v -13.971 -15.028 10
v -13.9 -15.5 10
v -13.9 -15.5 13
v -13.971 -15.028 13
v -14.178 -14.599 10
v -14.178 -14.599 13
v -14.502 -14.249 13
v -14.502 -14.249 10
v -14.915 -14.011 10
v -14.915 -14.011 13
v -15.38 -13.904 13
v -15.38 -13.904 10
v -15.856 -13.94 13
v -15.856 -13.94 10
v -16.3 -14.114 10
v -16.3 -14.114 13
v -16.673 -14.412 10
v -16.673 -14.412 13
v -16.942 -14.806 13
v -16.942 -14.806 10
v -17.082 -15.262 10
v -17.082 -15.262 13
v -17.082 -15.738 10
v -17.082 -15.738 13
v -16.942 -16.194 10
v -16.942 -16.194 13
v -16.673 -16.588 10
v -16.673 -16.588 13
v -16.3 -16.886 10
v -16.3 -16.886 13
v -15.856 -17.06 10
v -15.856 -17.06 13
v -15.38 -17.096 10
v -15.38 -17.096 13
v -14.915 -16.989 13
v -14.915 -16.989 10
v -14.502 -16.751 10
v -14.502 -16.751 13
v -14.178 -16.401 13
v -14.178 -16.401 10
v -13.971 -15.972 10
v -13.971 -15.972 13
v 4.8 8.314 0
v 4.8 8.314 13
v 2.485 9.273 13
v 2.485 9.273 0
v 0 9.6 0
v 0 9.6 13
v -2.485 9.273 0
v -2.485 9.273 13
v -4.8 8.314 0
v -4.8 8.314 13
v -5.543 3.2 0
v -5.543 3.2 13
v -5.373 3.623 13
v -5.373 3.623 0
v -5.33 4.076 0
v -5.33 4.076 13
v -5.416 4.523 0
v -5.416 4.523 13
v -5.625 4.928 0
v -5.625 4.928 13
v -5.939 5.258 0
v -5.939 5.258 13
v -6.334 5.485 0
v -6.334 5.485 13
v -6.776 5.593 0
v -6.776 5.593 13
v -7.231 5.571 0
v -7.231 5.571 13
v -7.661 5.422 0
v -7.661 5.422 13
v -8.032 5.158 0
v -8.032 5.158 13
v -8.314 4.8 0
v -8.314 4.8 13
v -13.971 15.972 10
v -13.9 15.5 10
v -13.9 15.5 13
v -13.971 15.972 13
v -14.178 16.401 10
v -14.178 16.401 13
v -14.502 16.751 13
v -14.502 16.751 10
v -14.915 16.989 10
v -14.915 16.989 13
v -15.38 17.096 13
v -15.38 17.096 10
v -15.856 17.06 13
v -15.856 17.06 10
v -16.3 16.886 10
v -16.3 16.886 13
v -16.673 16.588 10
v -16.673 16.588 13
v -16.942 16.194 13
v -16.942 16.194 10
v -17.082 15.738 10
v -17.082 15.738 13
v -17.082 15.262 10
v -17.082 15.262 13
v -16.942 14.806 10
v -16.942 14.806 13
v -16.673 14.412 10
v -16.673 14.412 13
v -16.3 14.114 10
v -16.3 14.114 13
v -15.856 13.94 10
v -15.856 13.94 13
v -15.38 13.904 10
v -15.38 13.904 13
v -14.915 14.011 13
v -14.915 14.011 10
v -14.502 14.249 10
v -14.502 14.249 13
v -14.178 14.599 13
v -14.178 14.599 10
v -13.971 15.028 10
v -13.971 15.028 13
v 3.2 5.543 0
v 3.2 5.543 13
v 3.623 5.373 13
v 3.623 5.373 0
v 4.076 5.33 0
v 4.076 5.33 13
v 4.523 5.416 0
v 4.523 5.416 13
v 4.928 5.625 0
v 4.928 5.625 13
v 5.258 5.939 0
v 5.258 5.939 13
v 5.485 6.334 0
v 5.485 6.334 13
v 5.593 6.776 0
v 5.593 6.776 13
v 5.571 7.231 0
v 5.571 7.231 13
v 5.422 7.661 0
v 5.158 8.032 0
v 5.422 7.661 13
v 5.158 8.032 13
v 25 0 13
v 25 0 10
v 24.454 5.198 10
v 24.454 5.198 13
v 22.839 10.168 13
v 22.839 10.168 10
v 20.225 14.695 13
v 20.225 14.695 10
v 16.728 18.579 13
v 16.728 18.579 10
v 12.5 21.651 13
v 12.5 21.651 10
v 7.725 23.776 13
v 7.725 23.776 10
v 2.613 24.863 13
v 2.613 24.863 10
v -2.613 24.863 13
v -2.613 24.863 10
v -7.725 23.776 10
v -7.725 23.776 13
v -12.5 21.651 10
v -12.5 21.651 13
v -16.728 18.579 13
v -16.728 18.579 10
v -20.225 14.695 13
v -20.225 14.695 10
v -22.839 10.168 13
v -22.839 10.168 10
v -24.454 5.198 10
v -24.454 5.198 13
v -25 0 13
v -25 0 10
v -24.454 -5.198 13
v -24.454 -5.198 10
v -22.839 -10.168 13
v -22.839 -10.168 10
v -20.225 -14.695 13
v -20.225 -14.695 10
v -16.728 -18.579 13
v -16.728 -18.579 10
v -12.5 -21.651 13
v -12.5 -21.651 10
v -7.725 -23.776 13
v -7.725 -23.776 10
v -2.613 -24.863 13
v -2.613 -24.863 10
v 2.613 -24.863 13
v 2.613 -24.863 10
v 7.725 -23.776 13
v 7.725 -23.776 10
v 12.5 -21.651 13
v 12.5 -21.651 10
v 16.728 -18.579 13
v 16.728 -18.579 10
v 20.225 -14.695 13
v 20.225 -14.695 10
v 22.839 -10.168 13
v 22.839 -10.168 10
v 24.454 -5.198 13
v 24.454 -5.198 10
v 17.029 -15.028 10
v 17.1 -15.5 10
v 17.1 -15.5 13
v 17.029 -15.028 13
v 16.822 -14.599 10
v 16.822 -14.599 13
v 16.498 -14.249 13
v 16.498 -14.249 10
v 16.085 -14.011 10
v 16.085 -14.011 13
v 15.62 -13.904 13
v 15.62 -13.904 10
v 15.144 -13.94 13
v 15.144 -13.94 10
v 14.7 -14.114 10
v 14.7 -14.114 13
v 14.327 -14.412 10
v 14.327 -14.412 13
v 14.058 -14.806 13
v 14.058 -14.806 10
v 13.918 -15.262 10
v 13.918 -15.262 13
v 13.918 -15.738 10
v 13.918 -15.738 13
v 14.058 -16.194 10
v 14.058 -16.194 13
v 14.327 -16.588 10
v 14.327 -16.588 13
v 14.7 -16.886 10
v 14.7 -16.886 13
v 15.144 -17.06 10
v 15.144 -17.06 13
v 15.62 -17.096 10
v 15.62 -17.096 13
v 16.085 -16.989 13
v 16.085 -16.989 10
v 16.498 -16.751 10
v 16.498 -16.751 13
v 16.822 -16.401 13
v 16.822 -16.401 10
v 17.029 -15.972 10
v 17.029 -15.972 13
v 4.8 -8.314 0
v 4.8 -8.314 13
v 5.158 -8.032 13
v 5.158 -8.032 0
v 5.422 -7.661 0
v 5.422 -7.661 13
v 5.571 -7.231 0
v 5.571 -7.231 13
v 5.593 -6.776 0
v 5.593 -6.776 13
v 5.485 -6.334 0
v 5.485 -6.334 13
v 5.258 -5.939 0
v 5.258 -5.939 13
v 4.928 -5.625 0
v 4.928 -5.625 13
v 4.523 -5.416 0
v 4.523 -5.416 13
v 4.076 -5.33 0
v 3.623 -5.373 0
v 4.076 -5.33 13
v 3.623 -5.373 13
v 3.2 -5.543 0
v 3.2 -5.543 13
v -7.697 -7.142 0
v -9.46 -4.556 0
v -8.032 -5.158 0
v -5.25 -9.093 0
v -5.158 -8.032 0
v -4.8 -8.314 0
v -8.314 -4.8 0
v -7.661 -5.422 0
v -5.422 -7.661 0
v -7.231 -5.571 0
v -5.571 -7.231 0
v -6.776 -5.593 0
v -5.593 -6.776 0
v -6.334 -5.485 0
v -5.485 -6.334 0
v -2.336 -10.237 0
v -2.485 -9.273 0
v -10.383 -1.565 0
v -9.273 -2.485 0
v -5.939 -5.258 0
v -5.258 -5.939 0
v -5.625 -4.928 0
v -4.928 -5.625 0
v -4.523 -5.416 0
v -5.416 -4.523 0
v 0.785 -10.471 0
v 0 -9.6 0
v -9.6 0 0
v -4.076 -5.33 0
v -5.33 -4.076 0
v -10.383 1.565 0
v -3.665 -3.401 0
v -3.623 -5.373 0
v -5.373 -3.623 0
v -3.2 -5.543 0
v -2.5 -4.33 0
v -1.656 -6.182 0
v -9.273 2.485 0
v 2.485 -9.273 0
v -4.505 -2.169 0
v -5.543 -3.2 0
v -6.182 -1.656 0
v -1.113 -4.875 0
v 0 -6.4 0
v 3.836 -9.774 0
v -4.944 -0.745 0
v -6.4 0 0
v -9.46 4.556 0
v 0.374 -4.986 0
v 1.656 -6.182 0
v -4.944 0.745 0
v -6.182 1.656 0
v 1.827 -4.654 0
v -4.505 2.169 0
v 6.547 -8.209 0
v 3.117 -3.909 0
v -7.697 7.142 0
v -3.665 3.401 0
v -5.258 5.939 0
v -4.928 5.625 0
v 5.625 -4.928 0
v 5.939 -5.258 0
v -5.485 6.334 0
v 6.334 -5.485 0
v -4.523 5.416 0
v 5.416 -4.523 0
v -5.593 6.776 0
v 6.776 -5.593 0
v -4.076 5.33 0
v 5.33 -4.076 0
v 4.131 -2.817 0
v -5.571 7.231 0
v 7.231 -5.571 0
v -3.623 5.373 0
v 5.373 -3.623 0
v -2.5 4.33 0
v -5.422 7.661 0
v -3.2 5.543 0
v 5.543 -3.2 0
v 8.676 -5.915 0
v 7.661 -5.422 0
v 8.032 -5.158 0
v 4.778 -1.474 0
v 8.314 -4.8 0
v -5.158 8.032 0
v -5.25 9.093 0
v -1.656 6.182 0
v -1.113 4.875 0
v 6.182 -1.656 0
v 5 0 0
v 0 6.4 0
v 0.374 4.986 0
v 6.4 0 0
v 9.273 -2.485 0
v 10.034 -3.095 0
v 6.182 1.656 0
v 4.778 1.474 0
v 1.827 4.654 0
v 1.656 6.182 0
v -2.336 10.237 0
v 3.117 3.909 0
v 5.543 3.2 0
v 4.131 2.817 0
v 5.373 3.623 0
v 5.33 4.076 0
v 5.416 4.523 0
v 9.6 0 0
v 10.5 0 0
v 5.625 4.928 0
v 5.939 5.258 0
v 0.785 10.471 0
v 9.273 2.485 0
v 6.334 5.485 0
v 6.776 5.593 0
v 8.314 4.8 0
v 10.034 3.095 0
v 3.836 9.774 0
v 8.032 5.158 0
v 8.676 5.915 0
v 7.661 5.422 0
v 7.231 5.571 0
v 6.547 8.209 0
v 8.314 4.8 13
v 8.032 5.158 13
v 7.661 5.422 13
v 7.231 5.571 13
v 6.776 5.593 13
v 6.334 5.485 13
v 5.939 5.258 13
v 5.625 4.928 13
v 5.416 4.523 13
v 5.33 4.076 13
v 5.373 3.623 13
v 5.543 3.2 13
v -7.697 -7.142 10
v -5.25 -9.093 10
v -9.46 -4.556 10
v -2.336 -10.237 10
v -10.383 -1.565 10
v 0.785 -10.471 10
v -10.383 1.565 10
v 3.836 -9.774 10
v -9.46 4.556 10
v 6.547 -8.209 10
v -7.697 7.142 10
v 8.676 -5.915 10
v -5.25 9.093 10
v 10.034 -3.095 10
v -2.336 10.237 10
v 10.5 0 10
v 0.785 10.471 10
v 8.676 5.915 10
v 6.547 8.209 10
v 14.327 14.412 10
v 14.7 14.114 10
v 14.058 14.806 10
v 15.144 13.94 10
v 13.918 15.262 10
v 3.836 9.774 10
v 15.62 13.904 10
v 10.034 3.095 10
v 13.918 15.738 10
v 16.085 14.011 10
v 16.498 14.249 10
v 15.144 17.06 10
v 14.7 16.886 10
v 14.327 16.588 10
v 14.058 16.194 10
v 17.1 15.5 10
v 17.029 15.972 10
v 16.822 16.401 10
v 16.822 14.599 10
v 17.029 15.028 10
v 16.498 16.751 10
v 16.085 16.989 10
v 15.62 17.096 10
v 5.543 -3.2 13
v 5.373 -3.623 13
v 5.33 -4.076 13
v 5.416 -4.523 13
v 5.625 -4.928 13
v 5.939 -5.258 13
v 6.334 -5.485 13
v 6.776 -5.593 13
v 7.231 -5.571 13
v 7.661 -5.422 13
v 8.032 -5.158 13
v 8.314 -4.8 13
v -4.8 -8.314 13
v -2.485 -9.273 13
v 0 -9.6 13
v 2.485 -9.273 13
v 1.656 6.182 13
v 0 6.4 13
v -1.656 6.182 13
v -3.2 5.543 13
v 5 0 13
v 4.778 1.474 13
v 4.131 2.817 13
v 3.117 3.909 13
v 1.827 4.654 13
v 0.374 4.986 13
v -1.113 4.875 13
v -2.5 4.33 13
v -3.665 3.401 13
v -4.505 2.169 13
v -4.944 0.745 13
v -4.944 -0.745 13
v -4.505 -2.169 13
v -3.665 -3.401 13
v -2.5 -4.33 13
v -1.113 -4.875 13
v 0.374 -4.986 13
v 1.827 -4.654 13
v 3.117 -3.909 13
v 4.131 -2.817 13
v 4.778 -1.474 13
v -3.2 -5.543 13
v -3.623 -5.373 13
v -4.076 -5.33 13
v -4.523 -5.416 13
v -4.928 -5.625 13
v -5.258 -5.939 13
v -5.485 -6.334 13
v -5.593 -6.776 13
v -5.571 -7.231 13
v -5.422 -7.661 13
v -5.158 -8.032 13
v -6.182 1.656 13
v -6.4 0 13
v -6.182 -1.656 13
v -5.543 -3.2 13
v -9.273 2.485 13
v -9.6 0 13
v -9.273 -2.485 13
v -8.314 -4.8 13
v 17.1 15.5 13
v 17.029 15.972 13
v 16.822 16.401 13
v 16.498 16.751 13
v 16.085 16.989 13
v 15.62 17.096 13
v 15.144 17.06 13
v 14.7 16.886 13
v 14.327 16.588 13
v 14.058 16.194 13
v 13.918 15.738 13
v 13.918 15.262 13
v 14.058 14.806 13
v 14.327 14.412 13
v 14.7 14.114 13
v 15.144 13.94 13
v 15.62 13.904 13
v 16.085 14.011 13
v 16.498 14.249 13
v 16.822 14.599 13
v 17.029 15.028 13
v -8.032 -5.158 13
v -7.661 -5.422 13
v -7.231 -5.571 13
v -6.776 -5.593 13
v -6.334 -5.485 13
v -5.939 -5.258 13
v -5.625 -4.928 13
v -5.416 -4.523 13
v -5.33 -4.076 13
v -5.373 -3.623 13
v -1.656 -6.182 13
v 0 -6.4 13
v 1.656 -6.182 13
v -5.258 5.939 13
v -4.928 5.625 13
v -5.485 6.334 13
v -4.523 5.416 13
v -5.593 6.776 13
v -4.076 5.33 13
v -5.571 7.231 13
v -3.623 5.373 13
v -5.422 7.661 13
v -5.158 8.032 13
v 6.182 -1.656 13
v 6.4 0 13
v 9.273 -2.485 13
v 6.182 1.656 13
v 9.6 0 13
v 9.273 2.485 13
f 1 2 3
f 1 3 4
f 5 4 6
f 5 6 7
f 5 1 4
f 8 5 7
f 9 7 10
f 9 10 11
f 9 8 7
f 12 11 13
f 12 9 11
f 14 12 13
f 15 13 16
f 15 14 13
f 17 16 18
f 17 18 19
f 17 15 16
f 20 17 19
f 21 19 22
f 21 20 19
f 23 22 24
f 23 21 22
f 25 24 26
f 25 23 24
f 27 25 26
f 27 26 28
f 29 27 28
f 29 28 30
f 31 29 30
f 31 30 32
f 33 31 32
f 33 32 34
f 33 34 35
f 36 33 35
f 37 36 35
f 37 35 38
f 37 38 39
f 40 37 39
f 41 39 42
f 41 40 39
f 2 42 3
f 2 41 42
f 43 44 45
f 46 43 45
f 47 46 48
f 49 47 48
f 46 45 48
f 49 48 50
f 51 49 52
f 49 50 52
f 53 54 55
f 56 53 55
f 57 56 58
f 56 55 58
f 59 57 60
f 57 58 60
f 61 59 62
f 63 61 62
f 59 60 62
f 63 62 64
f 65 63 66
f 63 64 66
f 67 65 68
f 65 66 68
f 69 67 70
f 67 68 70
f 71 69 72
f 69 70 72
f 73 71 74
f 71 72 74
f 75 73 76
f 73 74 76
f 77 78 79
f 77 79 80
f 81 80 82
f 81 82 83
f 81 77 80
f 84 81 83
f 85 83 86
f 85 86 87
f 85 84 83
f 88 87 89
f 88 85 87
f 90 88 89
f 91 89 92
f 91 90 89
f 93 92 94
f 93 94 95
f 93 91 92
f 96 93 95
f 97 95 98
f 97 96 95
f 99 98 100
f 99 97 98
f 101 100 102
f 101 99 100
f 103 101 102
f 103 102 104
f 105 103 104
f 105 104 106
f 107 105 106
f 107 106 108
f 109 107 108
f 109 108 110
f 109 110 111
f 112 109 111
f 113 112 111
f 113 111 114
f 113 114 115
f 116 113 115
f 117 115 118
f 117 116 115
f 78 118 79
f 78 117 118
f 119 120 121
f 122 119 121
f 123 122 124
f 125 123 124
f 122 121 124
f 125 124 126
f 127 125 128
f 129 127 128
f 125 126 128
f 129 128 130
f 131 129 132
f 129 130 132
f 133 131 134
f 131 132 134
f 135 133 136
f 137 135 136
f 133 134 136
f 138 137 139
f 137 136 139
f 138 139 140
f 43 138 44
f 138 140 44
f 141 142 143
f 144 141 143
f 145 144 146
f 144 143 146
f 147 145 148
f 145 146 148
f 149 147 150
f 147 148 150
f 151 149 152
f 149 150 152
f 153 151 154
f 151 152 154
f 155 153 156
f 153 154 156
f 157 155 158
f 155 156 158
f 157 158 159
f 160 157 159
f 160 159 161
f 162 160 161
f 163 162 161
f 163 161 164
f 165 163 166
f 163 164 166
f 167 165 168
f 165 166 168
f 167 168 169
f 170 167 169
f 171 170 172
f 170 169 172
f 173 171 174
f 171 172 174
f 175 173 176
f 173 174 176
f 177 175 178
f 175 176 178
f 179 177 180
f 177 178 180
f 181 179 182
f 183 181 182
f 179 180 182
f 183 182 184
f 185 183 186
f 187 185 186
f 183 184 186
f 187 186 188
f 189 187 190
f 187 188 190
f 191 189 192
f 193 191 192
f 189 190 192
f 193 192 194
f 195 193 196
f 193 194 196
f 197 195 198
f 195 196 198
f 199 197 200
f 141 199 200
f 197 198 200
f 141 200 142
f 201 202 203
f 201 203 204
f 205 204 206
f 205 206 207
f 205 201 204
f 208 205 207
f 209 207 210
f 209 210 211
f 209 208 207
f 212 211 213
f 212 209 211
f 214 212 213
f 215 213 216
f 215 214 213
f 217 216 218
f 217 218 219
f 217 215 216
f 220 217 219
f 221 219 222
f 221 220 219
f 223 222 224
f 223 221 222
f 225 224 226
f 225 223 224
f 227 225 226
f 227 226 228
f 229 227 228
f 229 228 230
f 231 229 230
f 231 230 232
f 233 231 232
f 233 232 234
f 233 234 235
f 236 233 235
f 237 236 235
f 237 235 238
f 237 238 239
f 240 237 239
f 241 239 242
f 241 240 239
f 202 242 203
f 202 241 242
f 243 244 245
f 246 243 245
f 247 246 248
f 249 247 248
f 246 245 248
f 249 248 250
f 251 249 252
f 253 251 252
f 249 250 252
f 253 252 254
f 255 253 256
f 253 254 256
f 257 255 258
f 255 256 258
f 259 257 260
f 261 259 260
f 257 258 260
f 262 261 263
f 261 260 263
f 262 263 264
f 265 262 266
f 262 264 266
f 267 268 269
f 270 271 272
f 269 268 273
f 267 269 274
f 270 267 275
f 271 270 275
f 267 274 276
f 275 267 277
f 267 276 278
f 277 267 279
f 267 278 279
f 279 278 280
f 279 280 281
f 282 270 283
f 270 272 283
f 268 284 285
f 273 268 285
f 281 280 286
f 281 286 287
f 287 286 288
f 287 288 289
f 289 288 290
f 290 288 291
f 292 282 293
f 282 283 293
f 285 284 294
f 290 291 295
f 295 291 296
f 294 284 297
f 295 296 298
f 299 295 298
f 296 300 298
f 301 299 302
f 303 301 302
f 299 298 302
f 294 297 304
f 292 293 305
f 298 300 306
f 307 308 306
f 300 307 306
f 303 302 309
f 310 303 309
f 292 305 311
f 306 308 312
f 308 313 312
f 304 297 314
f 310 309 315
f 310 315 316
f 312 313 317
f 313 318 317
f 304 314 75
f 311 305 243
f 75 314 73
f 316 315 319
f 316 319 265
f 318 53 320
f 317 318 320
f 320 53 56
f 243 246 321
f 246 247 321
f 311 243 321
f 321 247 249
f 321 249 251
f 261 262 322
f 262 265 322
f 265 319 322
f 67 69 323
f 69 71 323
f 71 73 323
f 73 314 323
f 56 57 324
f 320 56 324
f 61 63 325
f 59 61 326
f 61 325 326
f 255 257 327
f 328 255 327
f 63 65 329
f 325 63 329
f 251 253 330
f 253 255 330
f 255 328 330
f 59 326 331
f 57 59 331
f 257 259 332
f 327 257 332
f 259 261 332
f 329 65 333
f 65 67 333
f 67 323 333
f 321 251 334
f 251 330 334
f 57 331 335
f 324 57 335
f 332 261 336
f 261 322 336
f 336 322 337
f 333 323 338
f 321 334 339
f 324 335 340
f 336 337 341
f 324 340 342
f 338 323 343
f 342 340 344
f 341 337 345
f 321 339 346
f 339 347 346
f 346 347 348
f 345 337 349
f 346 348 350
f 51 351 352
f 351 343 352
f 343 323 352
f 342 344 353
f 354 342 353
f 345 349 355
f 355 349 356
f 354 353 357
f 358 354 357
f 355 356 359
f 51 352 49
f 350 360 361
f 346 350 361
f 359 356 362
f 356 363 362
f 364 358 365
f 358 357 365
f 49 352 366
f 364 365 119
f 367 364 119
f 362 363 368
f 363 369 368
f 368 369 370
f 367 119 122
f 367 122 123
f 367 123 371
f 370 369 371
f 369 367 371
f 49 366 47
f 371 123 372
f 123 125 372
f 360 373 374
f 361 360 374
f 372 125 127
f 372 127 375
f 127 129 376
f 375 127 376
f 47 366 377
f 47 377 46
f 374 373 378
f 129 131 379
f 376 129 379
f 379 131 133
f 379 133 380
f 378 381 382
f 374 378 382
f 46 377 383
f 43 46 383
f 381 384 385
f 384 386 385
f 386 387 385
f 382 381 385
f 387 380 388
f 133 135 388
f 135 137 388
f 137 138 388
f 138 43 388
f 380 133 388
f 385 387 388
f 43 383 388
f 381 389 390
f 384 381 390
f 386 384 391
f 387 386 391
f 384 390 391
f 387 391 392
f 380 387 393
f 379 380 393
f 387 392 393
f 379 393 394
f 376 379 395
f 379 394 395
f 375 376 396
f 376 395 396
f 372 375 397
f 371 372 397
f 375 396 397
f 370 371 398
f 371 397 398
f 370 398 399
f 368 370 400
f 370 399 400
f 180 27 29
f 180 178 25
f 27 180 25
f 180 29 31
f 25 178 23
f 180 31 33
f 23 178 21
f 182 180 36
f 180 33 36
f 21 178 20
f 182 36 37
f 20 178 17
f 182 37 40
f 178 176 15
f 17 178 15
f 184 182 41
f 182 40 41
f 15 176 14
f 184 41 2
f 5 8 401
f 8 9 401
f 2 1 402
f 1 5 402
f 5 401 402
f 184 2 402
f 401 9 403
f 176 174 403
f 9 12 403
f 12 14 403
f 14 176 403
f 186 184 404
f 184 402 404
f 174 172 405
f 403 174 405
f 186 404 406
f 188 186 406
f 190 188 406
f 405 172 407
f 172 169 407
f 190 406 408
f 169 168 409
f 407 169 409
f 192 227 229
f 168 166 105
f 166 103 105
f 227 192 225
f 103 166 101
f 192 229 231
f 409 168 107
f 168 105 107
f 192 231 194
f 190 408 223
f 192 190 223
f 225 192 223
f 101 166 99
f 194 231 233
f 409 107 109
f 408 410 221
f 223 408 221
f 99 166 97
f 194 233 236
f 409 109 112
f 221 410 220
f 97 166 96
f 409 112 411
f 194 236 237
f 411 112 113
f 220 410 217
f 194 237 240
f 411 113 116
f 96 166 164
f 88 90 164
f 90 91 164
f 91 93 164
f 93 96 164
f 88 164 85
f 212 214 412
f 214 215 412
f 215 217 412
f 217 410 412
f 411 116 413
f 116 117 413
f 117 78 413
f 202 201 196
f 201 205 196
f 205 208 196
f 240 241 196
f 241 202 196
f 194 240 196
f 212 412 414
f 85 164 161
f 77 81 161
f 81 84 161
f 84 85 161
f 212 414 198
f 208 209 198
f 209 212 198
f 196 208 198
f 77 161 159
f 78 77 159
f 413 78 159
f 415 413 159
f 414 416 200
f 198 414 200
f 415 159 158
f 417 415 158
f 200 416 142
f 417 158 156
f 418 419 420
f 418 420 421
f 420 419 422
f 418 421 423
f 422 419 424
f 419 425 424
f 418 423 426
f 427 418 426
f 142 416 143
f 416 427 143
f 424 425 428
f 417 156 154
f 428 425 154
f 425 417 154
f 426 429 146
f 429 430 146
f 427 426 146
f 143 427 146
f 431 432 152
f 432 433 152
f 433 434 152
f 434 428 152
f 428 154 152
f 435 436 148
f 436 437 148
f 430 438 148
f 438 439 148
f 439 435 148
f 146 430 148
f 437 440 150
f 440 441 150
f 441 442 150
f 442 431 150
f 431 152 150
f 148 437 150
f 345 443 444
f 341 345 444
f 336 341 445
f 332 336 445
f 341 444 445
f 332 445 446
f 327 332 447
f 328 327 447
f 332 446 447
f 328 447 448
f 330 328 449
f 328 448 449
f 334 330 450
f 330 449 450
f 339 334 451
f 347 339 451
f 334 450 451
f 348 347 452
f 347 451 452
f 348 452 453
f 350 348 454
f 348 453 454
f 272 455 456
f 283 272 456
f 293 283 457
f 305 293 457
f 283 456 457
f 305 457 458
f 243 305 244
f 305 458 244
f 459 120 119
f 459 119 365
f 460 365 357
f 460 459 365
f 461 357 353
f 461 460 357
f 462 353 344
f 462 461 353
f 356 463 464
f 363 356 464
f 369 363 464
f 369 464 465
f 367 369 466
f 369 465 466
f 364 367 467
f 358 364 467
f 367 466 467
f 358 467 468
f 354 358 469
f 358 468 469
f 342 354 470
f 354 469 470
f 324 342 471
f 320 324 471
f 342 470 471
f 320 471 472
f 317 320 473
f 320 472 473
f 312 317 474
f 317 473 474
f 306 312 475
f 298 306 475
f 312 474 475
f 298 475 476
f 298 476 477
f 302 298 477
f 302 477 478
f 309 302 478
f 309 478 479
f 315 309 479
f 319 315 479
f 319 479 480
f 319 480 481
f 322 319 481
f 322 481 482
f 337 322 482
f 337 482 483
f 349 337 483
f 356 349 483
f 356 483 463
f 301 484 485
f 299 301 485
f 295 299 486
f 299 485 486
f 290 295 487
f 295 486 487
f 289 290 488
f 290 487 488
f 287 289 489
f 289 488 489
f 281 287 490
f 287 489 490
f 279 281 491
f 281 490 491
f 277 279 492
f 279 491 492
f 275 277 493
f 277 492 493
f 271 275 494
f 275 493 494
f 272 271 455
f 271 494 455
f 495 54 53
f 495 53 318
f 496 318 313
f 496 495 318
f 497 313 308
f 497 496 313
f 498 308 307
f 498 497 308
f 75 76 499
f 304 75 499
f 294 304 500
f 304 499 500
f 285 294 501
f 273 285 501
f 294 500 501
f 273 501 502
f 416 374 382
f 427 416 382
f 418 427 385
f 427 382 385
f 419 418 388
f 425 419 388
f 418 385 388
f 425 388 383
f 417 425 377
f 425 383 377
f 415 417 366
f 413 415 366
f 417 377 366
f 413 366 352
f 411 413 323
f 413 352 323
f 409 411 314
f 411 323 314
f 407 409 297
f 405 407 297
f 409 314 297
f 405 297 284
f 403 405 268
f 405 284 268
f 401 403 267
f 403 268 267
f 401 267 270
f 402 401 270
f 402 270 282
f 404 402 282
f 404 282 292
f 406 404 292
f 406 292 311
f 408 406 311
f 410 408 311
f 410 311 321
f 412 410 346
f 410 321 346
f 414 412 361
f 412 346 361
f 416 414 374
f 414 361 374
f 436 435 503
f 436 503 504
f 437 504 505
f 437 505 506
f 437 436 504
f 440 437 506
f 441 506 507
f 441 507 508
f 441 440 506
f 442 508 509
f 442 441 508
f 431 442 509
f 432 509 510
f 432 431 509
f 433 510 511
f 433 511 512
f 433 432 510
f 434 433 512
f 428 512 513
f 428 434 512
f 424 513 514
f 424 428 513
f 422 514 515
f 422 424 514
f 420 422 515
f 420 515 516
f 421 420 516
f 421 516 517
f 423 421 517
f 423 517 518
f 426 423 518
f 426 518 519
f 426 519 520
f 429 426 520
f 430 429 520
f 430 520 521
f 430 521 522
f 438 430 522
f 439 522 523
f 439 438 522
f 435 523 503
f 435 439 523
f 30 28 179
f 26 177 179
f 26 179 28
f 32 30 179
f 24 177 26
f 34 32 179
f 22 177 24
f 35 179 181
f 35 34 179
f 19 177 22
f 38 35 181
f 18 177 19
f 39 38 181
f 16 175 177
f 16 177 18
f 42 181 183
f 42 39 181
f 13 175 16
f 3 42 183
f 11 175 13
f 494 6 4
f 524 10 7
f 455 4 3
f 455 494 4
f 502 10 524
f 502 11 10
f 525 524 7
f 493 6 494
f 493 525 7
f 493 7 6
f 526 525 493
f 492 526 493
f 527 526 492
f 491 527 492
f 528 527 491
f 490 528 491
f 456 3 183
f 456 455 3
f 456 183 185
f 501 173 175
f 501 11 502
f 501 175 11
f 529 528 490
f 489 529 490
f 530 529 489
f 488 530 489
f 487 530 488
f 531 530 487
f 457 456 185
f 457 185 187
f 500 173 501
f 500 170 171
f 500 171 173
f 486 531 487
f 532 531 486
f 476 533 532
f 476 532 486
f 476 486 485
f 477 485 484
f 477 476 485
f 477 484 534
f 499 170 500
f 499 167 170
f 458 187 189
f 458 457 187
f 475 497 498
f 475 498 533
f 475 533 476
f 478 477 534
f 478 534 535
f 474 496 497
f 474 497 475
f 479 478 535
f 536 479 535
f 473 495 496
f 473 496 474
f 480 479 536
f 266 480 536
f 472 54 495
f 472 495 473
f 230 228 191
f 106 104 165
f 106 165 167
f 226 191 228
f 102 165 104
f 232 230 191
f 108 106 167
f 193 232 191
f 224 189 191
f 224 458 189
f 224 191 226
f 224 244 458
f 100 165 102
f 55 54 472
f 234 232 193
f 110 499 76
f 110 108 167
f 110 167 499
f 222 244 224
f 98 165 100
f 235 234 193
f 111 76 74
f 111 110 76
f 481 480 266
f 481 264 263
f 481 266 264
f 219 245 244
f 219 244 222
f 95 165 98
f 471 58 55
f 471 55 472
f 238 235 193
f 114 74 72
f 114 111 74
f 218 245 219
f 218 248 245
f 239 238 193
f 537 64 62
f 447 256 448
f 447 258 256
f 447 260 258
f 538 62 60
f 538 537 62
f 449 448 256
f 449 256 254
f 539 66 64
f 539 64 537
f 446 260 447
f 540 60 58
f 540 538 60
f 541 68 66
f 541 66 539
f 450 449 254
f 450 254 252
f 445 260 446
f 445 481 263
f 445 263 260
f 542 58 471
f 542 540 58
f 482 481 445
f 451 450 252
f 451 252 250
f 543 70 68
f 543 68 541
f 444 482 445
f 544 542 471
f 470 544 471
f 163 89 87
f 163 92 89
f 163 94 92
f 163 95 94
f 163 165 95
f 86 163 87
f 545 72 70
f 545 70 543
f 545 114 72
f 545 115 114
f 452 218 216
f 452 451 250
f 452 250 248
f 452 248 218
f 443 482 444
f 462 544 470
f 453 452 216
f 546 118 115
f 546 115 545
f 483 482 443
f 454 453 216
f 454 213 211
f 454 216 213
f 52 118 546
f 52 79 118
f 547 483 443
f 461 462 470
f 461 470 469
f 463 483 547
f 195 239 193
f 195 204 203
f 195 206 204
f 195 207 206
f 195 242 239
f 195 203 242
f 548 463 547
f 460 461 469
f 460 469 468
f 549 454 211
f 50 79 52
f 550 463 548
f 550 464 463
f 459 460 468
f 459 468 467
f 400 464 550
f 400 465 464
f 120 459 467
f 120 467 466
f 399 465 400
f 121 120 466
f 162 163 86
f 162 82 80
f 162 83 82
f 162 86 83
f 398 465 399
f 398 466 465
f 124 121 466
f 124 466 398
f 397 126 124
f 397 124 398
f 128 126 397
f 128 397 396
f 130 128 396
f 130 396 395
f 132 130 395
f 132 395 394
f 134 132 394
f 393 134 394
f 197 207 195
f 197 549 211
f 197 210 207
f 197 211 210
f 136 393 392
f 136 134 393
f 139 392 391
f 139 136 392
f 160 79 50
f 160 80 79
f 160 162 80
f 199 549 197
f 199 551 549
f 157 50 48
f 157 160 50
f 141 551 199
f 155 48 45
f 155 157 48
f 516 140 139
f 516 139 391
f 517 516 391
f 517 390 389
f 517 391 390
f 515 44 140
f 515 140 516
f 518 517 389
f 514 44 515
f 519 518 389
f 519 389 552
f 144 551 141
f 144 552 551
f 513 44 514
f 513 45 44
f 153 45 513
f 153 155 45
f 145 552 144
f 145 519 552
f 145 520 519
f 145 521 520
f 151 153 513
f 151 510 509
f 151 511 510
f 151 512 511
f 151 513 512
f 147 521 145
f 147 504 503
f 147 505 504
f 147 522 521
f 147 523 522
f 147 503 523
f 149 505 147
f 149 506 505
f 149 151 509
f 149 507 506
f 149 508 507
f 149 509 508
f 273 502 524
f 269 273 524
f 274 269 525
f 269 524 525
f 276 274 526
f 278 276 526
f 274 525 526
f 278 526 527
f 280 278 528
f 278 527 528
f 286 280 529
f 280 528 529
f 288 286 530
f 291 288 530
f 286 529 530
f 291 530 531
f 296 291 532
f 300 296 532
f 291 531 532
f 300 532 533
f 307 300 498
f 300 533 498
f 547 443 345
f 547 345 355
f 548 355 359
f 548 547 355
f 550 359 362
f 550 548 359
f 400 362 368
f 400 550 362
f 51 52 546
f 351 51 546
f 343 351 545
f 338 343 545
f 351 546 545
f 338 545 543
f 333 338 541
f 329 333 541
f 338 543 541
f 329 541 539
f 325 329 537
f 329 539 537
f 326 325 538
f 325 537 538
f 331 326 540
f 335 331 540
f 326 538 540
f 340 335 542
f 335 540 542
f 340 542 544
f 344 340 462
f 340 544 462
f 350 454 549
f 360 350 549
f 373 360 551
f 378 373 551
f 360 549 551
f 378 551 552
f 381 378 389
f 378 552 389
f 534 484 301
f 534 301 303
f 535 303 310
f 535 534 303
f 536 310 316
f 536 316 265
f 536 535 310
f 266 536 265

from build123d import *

# Parameters (mm, degrees)
SKETCH_R        = 10.5
PAD_DEPTH       = 10
SKETCH001_R     = 25
SKETCH001_R_2   = 1.6
PAD001_DEPTH    = 3
SKETCH002_R     = 5
POCKET_DEPTH    = 13.001
POCKET001_DEPTH = 13.001


with BuildPart() as part:
    # Sketch → Pad (new body)
    with BuildSketch(Plane.XY):
        Circle(SKETCH_R)
    extrude(amount=PAD_DEPTH)

    # Sketch001 (on Face3 of Pad) → Pad001 (join)
    with BuildSketch(Plane.XY.offset(10)):
        Circle(SKETCH001_R)
        with Locations((-15.5, -15.5)):
            Circle(SKETCH001_R_2, mode=Mode.SUBTRACT)
        with Locations((15.5, -15.5)):
            Circle(SKETCH001_R_2, mode=Mode.SUBTRACT)
        with Locations((15.5, 15.5)):
            Circle(SKETCH001_R_2, mode=Mode.SUBTRACT)
        with Locations((-15.5, 15.5)):
            Circle(SKETCH001_R_2, mode=Mode.SUBTRACT)
    extrude(amount=PAD001_DEPTH)

    # Sketch002 (on Face3 of Pad001) → Pocket (cut, through all)
    with BuildSketch(Plane.XY.offset(13)):
        Circle(SKETCH002_R)
    extrude(amount=-POCKET_DEPTH, mode=Mode.SUBTRACT)

    # Sketch003 (on Face3 of Pocket) → Pocket001 (cut, through all)
    with BuildSketch(Plane.XY.offset(13)):
        with BuildLine():
            ThreePointArc((3.2, 5.542563), (5.385641, 6.128203), (4.8, 8.313844))
            ThreePointArc((4.8, 8.313844), (0, 9.6), (-4.8, 8.313844))
            ThreePointArc((-4.8, 8.313844), (-5.385641, 6.128203), (-3.2, 5.542563))
            ThreePointArc((3.2, 5.542563), (0, 6.4), (-3.2, 5.542563))
        make_face()
        with BuildLine():
            ThreePointArc((8.313844, 4.8), (6.128203, 5.385641), (5.542563, 3.2))
            ThreePointArc((5.542563, -3.2), (6.4, 0), (5.542563, 3.2))
            ThreePointArc((5.542563, -3.2), (6.128203, -5.385641), (8.313844, -4.8))
            ThreePointArc((8.313844, -4.8), (9.6, 0), (8.313844, 4.8))
        make_face()
        with BuildLine():
            ThreePointArc((-5.542563, 3.2), (-6.128203, 5.385641), (-8.313844, 4.799999))
            ThreePointArc((-8.313844, 4.799999), (-9.6, 0), (-8.313844, -4.799999))
            ThreePointArc((-8.313844, -4.799999), (-6.128203, -5.385641), (-5.542563, -3.199999))
            ThreePointArc((-5.542563, 3.2), (-6.4, 0), (-5.542563, -3.199999))
        make_face()
        with BuildLine():
            ThreePointArc((4.8, -8.313844), (5.385641, -6.128203), (3.2, -5.542563))
            ThreePointArc((-3.199999, -5.542563), (0, -6.4), (3.2, -5.542563))
            ThreePointArc((-3.199999, -5.542563), (-5.38564, -6.128203), (-4.8, -8.313844))
            ThreePointArc((-4.8, -8.313844), (0, -9.6), (4.8, -8.313844))
        make_face()
    extrude(amount=-POCKET001_DEPTH, mode=Mode.SUBTRACT)


solid = part.part
